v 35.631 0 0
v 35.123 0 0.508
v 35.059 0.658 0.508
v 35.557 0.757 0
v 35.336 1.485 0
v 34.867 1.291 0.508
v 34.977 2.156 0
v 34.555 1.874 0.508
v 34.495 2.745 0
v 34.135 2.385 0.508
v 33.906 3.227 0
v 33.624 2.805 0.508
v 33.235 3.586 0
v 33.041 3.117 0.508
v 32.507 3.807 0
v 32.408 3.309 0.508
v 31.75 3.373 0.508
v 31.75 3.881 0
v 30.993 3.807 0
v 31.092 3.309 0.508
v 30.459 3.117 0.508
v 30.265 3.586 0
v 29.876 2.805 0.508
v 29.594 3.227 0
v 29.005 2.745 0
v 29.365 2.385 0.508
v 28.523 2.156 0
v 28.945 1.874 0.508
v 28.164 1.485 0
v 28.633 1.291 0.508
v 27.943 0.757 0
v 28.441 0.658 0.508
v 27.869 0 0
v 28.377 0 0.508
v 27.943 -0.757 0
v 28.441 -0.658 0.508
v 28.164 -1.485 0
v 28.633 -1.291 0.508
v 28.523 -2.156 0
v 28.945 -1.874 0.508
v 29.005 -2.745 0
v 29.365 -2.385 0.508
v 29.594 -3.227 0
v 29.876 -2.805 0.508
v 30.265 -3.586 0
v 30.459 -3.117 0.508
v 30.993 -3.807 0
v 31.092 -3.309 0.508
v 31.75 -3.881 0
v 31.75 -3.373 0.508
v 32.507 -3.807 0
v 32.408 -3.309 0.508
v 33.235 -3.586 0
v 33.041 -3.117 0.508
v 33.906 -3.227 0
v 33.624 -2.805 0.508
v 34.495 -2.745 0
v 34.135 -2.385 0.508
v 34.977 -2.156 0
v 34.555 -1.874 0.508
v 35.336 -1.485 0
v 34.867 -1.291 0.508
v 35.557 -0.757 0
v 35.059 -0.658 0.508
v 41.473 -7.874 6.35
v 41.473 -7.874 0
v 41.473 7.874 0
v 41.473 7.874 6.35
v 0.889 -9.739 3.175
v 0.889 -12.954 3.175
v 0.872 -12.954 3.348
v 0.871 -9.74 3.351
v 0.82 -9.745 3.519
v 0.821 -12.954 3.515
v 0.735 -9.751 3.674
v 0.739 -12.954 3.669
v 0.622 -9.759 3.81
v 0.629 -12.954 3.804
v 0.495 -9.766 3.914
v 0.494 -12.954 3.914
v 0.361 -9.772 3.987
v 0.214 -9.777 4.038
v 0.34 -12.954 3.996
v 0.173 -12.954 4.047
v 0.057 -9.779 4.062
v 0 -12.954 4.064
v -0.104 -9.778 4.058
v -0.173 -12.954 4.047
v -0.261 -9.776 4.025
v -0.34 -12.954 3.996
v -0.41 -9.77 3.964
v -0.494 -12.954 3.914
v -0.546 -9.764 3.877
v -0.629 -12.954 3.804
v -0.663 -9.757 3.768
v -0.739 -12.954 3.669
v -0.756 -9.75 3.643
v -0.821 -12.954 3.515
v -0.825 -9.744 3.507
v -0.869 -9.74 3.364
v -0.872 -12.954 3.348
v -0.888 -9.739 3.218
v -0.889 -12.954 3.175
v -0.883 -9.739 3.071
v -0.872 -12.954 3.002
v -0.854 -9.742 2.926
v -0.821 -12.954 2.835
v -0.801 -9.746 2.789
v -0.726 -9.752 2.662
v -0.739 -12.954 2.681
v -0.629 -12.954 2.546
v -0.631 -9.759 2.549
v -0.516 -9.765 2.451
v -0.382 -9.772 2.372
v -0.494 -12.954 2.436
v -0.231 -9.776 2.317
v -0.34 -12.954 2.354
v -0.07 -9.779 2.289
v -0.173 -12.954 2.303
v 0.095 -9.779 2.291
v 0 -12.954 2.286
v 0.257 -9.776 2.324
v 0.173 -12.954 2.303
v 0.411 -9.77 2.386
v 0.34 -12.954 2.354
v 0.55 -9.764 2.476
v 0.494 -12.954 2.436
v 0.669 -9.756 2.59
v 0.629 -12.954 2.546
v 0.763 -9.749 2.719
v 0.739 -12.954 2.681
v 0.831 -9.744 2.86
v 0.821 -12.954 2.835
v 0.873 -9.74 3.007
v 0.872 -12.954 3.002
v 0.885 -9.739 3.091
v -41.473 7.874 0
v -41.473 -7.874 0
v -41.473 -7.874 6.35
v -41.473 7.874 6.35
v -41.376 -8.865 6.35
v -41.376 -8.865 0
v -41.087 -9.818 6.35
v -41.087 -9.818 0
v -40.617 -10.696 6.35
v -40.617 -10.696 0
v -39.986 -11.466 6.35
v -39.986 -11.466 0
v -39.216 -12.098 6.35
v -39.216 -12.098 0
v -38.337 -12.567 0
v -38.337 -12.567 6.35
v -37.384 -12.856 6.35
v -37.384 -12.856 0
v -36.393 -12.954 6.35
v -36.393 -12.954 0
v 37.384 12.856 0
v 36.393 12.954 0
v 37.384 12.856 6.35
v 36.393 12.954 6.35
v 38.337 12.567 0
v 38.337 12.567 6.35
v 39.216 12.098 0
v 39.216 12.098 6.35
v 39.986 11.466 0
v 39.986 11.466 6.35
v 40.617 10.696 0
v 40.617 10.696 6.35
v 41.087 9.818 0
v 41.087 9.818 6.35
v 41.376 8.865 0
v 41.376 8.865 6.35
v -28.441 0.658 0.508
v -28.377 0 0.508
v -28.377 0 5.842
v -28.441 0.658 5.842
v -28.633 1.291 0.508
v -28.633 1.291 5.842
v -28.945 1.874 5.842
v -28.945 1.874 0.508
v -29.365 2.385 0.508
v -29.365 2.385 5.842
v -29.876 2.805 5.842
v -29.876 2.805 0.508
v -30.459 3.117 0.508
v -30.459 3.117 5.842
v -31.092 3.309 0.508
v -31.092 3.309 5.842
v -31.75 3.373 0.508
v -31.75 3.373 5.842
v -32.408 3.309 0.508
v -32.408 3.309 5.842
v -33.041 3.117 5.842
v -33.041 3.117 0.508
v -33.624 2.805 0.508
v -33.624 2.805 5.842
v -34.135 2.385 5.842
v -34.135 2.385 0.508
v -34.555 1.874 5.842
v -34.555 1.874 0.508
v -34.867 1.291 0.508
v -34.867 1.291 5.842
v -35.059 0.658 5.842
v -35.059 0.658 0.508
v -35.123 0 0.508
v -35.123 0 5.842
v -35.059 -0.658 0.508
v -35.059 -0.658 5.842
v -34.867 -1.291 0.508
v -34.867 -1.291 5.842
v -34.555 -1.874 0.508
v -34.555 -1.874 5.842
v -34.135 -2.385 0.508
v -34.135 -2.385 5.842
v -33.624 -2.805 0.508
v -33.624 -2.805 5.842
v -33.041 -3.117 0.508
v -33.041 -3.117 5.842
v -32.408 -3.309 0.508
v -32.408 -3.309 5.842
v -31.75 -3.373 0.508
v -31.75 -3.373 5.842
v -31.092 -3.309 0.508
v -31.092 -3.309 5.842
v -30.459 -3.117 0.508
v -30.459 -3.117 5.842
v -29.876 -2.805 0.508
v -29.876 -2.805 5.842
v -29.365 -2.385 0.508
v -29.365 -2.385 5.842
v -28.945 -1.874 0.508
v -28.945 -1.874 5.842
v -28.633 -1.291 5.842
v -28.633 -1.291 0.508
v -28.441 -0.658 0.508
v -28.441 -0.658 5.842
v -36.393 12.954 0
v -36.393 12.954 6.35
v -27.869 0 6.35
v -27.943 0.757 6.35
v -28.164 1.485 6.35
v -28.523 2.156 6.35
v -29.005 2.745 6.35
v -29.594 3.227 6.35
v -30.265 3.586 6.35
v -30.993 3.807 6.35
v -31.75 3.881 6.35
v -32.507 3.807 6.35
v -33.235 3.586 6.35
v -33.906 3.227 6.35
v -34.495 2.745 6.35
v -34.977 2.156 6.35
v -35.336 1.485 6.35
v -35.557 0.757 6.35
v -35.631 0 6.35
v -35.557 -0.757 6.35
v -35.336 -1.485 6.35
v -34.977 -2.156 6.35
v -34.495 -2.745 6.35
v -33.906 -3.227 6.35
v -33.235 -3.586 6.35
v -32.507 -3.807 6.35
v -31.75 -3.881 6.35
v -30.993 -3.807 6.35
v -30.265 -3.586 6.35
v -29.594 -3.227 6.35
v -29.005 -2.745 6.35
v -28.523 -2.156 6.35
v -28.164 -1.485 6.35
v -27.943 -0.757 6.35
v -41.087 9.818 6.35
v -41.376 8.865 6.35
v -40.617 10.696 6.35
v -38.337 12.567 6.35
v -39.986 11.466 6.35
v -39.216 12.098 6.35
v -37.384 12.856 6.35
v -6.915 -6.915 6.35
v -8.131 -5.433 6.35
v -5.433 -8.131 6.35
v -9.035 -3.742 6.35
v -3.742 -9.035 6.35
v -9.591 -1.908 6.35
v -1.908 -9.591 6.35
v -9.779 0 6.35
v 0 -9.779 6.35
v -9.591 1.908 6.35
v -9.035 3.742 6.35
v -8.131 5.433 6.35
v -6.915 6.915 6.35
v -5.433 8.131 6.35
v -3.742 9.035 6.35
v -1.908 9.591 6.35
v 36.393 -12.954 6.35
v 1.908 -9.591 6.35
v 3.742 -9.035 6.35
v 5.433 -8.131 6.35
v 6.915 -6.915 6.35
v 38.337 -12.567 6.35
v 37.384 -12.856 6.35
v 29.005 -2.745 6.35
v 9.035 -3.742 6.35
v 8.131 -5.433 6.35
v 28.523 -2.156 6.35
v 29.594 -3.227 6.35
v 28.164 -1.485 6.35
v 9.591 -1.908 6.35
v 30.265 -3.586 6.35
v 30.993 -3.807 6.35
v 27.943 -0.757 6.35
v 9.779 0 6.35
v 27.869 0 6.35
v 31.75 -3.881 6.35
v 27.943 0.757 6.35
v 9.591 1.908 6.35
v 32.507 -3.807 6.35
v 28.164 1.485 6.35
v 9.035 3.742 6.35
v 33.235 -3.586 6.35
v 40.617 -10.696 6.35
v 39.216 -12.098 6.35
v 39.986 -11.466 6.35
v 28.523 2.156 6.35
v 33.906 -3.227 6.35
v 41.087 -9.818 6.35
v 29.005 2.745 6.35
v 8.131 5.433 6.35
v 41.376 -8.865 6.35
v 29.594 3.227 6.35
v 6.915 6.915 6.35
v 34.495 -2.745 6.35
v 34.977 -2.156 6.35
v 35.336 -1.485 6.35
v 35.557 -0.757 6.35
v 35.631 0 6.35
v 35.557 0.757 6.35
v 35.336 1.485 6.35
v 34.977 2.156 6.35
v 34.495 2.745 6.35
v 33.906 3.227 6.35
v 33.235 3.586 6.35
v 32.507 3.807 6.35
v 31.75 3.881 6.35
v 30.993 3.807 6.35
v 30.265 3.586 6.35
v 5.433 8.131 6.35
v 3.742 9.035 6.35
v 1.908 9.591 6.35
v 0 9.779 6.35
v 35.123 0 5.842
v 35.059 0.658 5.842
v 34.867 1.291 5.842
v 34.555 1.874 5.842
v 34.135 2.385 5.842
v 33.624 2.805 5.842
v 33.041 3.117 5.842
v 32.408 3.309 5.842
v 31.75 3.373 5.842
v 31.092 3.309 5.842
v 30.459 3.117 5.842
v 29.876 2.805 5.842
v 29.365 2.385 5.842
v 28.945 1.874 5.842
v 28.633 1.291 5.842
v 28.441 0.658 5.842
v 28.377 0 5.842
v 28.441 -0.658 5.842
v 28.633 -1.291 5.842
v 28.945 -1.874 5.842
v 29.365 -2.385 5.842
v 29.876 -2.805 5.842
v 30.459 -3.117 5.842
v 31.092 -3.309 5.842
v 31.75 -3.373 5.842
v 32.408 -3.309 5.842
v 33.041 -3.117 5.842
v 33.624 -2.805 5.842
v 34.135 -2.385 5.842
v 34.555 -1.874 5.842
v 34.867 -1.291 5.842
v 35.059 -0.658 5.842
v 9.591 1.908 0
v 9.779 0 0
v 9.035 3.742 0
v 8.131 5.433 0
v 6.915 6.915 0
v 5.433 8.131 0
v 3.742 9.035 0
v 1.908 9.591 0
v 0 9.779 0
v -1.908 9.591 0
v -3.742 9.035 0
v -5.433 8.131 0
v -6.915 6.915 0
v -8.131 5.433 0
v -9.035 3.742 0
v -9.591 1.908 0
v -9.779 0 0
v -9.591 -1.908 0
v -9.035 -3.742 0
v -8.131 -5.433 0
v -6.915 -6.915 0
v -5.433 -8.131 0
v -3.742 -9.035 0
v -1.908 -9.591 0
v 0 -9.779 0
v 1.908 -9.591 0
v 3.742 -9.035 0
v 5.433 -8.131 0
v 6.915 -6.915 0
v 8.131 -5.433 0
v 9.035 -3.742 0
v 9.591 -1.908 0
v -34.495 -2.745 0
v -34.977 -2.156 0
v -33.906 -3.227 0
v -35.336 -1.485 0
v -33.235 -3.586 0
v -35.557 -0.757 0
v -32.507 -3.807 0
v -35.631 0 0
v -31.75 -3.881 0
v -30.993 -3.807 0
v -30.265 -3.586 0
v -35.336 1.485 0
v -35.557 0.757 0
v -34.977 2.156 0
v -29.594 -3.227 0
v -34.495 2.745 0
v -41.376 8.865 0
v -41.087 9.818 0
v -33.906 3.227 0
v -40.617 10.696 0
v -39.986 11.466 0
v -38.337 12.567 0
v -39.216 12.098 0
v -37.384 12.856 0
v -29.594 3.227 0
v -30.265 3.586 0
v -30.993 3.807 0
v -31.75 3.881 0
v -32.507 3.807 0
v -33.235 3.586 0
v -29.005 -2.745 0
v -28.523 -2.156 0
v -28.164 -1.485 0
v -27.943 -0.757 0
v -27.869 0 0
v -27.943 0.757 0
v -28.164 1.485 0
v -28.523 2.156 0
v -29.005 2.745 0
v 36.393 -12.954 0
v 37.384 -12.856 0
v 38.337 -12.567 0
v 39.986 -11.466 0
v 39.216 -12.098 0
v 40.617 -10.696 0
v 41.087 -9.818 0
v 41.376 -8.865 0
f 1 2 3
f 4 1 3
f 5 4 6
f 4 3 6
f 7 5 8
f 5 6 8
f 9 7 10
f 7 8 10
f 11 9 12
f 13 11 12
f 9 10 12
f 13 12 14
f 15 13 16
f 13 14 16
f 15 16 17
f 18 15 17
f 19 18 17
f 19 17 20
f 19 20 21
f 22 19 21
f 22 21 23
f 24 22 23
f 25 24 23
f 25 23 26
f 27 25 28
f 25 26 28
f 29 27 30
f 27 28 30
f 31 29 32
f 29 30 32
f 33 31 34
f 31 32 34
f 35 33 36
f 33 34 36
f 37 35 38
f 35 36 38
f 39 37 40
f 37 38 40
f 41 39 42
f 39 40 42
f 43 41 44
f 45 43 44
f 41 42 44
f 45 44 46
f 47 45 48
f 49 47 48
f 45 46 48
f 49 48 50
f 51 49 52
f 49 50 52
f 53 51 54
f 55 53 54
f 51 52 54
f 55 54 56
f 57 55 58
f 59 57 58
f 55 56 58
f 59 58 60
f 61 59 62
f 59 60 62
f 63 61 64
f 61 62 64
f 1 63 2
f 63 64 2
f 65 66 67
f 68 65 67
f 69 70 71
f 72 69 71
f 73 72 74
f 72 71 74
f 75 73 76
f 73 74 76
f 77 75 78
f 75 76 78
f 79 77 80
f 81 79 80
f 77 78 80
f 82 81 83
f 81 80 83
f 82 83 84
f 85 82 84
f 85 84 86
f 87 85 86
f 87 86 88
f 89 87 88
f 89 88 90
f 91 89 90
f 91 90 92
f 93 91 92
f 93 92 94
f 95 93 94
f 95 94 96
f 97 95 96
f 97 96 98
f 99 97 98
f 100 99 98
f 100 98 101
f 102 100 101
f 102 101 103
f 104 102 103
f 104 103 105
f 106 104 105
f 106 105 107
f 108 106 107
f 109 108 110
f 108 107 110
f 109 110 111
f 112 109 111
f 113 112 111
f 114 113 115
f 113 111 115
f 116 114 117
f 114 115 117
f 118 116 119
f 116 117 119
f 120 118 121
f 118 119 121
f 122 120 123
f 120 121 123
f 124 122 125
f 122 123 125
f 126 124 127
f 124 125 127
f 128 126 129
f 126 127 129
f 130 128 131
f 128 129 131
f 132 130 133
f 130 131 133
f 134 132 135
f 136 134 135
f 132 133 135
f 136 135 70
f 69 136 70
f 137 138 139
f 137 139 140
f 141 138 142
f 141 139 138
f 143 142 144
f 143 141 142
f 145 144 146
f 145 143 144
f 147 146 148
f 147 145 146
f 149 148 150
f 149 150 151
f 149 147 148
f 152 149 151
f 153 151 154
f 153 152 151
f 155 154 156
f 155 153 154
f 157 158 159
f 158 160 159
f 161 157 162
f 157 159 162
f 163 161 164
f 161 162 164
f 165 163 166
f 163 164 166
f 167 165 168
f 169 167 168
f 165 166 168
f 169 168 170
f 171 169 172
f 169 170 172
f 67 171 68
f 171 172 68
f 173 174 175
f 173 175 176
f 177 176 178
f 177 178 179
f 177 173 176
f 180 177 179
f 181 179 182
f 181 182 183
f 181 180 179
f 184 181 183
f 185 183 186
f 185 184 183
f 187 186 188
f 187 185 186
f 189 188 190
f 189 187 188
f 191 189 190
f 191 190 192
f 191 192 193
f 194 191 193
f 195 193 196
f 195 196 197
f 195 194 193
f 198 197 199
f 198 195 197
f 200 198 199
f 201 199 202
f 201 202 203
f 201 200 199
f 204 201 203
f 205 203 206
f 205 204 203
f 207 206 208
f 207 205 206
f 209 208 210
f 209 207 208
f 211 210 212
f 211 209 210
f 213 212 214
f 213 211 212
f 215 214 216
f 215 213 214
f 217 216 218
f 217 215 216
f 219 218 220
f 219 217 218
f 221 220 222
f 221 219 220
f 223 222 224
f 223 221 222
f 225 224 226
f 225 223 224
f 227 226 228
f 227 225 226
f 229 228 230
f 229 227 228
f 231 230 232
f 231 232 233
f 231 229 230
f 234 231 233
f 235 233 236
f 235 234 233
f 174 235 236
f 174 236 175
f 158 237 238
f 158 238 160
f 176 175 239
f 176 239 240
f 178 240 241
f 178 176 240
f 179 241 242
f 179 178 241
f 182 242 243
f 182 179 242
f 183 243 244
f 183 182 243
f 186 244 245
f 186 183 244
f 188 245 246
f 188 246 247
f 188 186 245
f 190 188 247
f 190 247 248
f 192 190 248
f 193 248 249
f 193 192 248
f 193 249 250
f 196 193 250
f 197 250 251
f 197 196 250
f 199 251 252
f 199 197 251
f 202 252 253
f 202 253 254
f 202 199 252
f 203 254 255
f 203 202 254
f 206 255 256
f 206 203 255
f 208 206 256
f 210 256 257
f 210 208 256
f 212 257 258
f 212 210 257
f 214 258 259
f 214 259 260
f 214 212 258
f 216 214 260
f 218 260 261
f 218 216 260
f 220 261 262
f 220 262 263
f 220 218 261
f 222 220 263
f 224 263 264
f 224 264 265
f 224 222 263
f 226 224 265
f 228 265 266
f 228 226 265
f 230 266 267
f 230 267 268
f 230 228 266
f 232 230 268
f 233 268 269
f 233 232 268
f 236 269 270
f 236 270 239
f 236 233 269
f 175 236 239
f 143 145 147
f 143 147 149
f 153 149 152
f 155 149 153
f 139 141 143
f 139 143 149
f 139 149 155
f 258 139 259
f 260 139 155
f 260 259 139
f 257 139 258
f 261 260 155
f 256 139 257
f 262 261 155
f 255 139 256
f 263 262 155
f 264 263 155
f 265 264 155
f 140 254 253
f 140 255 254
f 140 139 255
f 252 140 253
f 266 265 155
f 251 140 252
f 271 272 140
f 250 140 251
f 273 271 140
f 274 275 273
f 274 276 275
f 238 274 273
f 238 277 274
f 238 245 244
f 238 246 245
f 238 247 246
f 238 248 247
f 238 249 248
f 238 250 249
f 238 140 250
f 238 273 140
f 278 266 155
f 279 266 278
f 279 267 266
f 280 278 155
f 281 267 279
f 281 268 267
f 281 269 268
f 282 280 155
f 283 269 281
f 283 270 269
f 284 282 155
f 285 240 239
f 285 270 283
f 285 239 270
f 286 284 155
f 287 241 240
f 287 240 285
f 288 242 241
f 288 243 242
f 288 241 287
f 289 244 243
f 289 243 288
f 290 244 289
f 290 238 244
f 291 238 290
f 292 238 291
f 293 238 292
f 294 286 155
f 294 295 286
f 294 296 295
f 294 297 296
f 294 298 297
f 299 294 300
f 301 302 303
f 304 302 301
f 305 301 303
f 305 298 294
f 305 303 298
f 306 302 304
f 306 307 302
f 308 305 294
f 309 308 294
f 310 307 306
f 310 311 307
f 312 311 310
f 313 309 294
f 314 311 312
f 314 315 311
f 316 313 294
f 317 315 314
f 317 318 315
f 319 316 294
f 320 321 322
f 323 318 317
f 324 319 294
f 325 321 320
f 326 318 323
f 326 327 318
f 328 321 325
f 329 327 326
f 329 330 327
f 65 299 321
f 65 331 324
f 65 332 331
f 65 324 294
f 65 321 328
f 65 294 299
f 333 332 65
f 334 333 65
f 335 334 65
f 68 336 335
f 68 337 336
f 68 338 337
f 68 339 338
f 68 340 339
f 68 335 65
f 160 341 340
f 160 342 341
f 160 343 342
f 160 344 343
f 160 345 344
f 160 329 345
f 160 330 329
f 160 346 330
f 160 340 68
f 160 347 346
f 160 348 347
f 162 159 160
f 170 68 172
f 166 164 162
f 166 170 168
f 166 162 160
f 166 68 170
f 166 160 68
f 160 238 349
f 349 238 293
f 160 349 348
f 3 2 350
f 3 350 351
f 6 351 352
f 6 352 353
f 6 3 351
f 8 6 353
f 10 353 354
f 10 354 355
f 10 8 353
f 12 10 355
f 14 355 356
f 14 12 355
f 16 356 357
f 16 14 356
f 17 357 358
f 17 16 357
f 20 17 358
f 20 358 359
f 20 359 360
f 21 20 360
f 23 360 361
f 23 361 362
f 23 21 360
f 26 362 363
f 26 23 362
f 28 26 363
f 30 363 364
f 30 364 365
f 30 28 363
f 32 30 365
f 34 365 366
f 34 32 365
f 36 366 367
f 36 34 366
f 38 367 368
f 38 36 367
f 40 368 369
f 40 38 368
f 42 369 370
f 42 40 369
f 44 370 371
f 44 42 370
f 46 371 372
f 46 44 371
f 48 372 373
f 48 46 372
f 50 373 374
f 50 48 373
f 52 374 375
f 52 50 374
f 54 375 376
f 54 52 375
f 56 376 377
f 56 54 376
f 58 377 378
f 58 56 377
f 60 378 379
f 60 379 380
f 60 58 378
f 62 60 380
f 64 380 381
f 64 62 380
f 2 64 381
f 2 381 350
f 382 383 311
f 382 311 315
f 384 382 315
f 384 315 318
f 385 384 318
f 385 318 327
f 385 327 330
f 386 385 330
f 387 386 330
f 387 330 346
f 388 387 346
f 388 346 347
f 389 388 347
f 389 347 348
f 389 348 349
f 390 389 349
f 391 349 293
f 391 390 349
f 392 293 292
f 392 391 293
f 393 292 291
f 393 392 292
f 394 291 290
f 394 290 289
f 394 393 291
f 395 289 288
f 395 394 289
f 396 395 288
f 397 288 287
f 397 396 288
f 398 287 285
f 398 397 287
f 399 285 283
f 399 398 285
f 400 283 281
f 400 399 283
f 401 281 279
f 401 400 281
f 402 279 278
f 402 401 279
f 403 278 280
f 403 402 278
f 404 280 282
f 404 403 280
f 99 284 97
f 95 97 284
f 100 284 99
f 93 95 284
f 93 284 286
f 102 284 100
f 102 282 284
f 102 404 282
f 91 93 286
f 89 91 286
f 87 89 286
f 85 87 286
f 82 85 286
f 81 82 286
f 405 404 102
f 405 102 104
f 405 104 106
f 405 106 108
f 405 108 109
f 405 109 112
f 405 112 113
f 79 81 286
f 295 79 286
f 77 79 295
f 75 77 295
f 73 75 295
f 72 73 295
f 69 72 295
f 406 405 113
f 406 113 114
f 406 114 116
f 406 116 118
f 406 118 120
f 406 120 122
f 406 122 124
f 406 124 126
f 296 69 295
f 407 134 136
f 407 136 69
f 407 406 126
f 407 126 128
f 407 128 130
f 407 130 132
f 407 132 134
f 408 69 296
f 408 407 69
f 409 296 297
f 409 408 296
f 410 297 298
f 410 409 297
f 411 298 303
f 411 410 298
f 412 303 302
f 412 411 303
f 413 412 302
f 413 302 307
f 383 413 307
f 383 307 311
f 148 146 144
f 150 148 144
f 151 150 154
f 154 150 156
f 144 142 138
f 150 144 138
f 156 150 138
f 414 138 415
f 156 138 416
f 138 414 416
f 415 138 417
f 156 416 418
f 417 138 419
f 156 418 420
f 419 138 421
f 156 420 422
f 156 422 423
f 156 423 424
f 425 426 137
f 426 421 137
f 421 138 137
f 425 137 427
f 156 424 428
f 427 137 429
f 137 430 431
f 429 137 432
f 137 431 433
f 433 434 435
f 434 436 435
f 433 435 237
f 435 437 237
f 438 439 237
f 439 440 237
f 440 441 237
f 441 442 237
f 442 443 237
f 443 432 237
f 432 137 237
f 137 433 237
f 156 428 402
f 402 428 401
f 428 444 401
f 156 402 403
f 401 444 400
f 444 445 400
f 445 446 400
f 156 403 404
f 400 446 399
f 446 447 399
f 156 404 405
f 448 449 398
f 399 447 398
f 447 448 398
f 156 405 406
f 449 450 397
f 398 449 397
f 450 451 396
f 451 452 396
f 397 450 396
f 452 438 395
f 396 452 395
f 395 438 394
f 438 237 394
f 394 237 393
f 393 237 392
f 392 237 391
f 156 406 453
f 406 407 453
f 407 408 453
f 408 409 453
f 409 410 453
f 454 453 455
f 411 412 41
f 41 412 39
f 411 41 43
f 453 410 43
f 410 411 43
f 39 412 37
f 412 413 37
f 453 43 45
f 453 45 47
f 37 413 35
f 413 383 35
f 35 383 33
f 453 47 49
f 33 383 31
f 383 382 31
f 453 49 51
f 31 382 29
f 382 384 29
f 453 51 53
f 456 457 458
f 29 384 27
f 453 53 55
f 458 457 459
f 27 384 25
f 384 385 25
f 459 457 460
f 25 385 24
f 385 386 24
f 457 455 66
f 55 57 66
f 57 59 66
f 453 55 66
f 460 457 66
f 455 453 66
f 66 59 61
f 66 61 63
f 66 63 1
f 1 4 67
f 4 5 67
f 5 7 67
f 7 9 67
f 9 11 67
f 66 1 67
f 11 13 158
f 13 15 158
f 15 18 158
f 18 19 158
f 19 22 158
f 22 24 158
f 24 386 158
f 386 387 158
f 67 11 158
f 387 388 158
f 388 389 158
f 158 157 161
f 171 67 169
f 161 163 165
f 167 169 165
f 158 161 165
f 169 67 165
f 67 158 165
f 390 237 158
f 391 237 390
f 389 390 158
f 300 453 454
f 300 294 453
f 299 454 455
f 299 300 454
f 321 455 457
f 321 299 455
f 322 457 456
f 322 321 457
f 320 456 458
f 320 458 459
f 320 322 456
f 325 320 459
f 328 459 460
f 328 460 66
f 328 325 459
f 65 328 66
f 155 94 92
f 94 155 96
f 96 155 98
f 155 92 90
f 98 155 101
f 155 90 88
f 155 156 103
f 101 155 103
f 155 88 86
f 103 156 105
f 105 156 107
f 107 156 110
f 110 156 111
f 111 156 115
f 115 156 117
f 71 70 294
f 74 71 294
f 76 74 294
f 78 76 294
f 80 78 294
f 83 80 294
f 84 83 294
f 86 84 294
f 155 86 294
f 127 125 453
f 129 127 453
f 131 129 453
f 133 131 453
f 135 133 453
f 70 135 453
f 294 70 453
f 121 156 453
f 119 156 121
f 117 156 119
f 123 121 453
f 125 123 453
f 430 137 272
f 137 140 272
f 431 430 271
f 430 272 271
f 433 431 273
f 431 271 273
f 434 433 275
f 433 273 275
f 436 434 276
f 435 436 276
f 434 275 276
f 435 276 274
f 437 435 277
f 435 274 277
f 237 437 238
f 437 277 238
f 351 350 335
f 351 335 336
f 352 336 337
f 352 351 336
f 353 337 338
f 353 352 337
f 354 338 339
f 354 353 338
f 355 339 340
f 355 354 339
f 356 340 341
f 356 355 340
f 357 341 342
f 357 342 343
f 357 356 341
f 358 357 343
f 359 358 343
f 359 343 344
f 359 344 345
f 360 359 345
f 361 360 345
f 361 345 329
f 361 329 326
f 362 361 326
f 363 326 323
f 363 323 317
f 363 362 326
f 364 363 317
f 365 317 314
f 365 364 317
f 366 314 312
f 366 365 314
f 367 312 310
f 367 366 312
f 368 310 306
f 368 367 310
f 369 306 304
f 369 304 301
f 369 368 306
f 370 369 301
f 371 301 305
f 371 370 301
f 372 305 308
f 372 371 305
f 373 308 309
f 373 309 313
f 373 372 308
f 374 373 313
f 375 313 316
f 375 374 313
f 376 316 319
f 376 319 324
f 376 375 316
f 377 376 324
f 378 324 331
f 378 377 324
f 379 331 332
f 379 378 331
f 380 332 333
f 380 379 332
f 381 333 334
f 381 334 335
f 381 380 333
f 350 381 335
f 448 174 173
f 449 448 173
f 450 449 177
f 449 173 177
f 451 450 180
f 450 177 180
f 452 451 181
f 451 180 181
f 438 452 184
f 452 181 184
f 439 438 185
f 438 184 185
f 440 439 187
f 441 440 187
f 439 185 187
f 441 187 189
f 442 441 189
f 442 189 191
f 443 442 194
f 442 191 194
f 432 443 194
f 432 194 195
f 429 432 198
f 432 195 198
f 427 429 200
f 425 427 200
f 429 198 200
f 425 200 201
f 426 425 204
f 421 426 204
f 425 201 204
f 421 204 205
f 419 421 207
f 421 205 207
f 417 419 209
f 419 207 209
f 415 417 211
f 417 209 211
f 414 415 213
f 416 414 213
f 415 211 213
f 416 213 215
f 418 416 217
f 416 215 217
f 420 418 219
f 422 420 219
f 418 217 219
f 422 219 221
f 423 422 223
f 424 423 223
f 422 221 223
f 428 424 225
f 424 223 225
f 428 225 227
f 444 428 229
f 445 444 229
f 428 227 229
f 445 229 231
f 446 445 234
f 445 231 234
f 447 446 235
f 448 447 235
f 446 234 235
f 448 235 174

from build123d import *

# Parameters (mm, degrees)
F0_W     = 82.946875
F0_H     = 25.908
F0_R     = 3.3734375
F0_R_2   = 9.779
F1_DEPTH = 6.35
F2_R     = 0.889
F3_DEPTH = 3.2164930276
F4_R     = 5.08
F5_SIZE  = 0.508


with BuildPart() as f1:
    # F0 (on Top) → F1 (new body)
    with BuildSketch(Plane.XY):
        Rectangle(F0_W, F0_H)
        with Locations((-31.75, 0)):
            Circle(F0_R, mode=Mode.SUBTRACT)
        Circle(F0_R_2, mode=Mode.SUBTRACT)
        with Locations((31.75, 0)):
            Circle(F0_R, mode=Mode.SUBTRACT)
    extrude(amount=F1_DEPTH)

    # F2 (on face) → F3 (cut, through all)
    with BuildSketch(Plane.XZ.offset(12.954)):
        with Locations((0, 3.175)):
            Circle(F2_R)
    extrude(amount=-F3_DEPTH, mode=Mode.SUBTRACT)

    # F4
    f4_edges = [f1.edges().sort_by_distance(p)[0] for p in [
        (-41.473438, -12.954, 3.175),
        (41.473438, -12.954, 3.175),
        (41.473438, 12.954, 3.175),
        (-41.473438, 12.954, 3.175),
    ]]
    fillet(f4_edges, radius=F4_R)

    # F5
    f5_edges = [f1.edges().sort_by_distance(p)[0] for p in [
        (-35.123438, 0, 6.35),
        (28.376562, 0, 6.35),
        (-35.123438, 0, 0),
        (28.376562, 0, 0),
    ]]
    chamfer(f5_edges, length=F5_SIZE)


solid = f1.part
